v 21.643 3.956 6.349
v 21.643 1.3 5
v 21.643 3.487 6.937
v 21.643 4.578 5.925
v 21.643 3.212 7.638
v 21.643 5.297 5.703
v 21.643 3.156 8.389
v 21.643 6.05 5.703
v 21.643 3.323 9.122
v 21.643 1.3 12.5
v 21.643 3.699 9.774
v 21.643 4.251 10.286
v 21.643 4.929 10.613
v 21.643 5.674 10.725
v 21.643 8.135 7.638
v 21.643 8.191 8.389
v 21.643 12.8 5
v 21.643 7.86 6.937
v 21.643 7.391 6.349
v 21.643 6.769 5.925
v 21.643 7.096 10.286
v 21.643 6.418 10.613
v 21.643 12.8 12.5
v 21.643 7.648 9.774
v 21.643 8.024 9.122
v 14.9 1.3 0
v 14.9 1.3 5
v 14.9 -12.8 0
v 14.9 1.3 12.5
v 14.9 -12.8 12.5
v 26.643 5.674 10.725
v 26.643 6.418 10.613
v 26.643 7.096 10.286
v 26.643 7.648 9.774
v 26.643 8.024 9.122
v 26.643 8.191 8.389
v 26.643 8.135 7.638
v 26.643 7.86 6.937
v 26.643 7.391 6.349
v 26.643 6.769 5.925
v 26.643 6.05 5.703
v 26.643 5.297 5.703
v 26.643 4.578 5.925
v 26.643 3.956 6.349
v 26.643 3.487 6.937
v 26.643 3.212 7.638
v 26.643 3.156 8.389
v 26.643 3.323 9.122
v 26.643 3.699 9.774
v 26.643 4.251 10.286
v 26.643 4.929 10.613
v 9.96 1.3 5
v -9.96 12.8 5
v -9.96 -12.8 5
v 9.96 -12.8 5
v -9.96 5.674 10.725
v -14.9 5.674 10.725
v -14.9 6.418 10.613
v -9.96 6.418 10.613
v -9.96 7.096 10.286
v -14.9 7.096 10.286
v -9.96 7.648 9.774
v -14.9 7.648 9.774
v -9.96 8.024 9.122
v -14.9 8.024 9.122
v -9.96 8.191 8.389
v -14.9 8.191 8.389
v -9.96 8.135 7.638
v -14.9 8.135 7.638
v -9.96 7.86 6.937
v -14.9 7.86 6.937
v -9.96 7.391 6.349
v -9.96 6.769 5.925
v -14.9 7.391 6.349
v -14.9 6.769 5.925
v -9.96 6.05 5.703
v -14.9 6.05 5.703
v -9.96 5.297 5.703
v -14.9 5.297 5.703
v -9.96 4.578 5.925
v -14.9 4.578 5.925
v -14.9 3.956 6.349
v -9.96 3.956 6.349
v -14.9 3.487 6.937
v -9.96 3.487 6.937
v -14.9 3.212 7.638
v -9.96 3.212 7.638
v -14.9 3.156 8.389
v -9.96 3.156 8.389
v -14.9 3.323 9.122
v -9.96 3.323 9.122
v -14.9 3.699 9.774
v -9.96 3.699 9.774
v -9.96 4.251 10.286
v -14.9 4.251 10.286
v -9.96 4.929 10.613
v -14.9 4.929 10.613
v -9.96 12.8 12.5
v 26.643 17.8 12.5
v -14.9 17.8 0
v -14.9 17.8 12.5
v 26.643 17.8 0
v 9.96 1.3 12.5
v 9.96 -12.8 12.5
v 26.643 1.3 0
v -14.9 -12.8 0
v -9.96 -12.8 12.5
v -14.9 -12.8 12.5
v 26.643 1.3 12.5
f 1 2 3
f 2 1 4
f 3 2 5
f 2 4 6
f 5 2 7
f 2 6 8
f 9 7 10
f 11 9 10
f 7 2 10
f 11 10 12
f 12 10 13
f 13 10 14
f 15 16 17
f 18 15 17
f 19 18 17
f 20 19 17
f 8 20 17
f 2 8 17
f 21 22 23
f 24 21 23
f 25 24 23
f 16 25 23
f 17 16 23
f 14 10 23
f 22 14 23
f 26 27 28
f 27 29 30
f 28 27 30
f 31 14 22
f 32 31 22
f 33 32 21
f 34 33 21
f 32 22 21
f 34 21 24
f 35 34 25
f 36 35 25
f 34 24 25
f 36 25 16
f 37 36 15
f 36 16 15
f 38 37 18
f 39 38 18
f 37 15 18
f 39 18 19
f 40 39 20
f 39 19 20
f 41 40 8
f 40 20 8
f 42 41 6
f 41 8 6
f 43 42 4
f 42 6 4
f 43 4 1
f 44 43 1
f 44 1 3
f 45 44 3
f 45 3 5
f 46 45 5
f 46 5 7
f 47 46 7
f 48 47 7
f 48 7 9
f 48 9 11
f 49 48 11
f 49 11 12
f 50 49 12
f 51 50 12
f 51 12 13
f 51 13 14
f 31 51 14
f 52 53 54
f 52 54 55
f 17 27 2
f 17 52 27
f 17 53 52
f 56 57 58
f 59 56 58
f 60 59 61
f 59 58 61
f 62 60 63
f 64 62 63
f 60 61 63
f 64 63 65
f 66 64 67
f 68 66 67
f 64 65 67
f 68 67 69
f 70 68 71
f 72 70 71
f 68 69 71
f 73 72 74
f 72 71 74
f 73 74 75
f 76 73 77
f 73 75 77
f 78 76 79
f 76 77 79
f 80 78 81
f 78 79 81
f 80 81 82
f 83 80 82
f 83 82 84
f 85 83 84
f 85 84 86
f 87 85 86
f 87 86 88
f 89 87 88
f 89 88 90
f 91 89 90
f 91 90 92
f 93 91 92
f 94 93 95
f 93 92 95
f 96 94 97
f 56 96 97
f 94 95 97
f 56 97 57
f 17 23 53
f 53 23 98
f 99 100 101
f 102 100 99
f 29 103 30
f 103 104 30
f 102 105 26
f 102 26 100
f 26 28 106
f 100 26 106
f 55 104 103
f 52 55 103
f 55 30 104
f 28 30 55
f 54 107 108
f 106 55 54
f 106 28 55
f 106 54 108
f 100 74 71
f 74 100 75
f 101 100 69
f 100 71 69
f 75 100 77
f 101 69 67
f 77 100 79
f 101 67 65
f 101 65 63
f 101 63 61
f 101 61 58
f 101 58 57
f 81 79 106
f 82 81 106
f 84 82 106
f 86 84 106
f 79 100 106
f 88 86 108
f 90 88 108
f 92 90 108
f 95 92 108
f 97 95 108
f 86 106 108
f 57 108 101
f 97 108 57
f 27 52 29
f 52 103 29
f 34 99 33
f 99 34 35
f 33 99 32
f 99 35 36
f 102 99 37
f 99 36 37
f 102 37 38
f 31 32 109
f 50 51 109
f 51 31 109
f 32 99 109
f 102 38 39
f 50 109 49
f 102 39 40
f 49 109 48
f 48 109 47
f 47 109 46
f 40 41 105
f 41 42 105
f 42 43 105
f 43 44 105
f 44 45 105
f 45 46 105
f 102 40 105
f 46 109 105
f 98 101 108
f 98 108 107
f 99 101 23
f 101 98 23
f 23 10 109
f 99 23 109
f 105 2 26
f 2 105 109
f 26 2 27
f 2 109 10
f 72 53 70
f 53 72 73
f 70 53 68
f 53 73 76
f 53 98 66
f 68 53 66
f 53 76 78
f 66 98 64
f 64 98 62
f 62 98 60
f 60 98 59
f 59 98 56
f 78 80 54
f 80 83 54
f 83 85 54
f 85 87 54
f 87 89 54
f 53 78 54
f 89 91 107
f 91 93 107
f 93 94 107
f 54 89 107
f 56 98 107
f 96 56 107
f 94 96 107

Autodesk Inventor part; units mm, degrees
ref_plane "YZ Plane" through (0, 0, 0) normal (1, 0, 0) x (0, 1, 0)
ref_plane "XZ Plane" through (0, 0, 0) normal (0, 1, 0) x (-1, 0, 0)
ref_plane "XY Plane" through (0, 0, 0) normal (0, 0, 1) x (1, 0, 0)
sketch "Sketch1" plane through (0, 0, 0) normal (0, 0, 1) x (1, 0, 0)
  line L0 (4.1434, -12.66) -> (3.2904, -12.66)
  line L1 (-14.9, 12.8) -> (14.9, 12.8)
  line L2 (14.9, 12.8) -> (14.9, -12.8)
  line L3 (14.9, -12.8) -> (-14.9, -12.8)
  line L4 (-14.9, -12.8) -> (-14.9, 12.8)
  point P0 (0, 0)
  point P1 (0, 12.8)
  point P2 (-14.9, 0)
  dimension "d4" = 29.8
  dimension "d5" = 25.6
extrude "Extrusion1" add sketch "Sketch1" along normal blind 12.5
sketch "Sketch2" plane through (0, 0, 12.5) normal (0, 0, 1) x (1, 0, 0)
  line L0 (-14.9, -12.8) -> (14.9, -12.8) projected
  line L1 (-9.96, -12.8) -> (9.96, -12.8)
  line L2 (9.96, -12.8) -> (9.96, 7.8)
  line L3 (9.96, 7.8) -> (-9.96, 7.8)
  line L4 (-9.96, 7.8) -> (-9.96, -12.8)
  line L5 (14.9, 12.8) -> (-14.9, 12.8) projected
  point P0 (0, 0)
  point P1 (0, 7.8)
  dimension "d8" = 19.92
  dimension "d9" = 5
extrude "Extrusion2" cut sketch "Sketch2" against normal blind 7.5
sketch "Sketch3" plane through (0, 0, 12.5) normal (0, 0, 1) x (1, 0, 0)
  line L0 (-0.14, 0.6) -> (-0.84, 1.3) projected
  line L1 (14.9, -12.8) -> (14.9, 12.8) projected
  line L2 (14.9, -3.7) -> (26.6432, -3.7)
  line L3 (26.6432, -3.7) -> (26.6432, 12.8)
  line L4 (26.6432, 12.8) -> (14.9, 12.8)
  line L5 (14.9, 12.8) -> (14.9, -3.7)
  line L6 (14.9, 12.8) -> (-14.9, 12.8) projected
  line L7 (-7.482, 1.9485) -> (17.86, 10.1145) projected
  line L8 (-7.482, 1.9485) -> (19.1432, 1.9485)
  line L9 (9.96, 7.8) -> (9.96, -12.8) projected
  line L10 (9.96, 1.3) -> (21.6432, 1.3)
  line L11 (21.6432, 1.3) -> (21.6432, 7.8)
  line L12 (21.6432, 7.8) -> (9.96, 7.8)
  line L13 (9.96, 7.8) -> (9.96, 1.3)
  line L14 (-9.96, 7.8) -> (9.96, 7.8) projected
  point P0 (0, 0)
  point P1 (15.8016, 1.3)
  point P2 (21.6432, 4.55)
  dimension "d12" = 5
  dimension "d13" = 7.5
  dimension "d14" = 5
extrude "Extrusion3" add sketch "Sketch3" against normal blind 12.5 contours L1 L10 L11 L12 L4 L3 L2 | L1 L12 L11 L10
sketch "Sketch4" plane through (0, 0, 12.5) normal (0, 0, 1) x (1, 0, 0)
  line L0 (21.6432, 7.8) -> (9.96, 7.8) projected
  line L1 (9.96, 7.8) -> (9.96, 1.3) projected
  line L2 (9.96, 1.3) -> (21.6432, 1.3) projected
  line L3 (21.6432, 1.3) -> (21.6432, 7.8) projected
  point P0 (0, 0)
extrude "Extrusion4" cut sketch "Sketch4" against normal blind 7.5
thicken "Thicken1" operation add thickness 5 both sides no extend neighbours no toward (0, 1, 0) faces at (12.7954, 12.8, 4.1667)
sketch "Sketch5" plane through (0, 0, 12.5) normal (0, 0, 1) x (1, 0, 0)
  line L0 (-9.96, 7.8) -> (21.6432, 7.8) projected
  line L1 (-9.96, 7.8) -> (21.6432, 7.8)
  line L2 (21.6432, 7.8) -> (21.6432, 12.8)
  line L3 (21.6432, 12.8) -> (-9.96, 12.8)
  line L4 (-9.96, 12.8) -> (-9.96, 7.8)
  line L5 (21.6432, 7.8) -> (21.6432, 1.3) projected
  point P0 (0, 0)
  dimension "d21" = 5
extrude "Extrusion5" cut sketch "Sketch5" against normal blind 7.5
sketch "Sketch6" plane through (-14.9, -12.8, 0) normal (-1, 0, 0) x (0, 0, 1)
  circle A0 centre (8.2, 18.4735) radius 2.525
  line L0 (10, 14.7485) -> (6.4, 14.7485) projected
  line L1 (6.6, 15.3) -> (9.8, 15.3)
  point P0 (0, 12.8)
  point P1 (8.2, 14.7485)
  point P2 (8.2, 15.9485)
  dimension "d24" = 5.05
  dimension "d25" = 1.2
extrude "Extrusion6" cut sketch "Sketch6" against normal through all
sketch "Sketch7" plane through (0, 0, 12.5) normal (0, 0, 1) x (1, 0, 0)
  line L0 (14.9, -3.7) -> (26.6432, -3.7) projected
  line L1 (26.6432, -3.7) -> (26.6432, 17.8) projected
  line L2 (14.9, -3.7) -> (26.6432, -3.7)
  line L3 (26.6432, -3.7) -> (26.6432, 1.3)
  line L4 (26.6432, 1.3) -> (14.9, 1.3)
  line L5 (14.9, 1.3) -> (14.9, -3.7)
  point P0 (0, 0)
  dimension "d28" = 5
extrude "Extrusion7" cut sketch "Sketch7" against normal through all
properties part number "SS-5FL111-3T_Housing_01"
